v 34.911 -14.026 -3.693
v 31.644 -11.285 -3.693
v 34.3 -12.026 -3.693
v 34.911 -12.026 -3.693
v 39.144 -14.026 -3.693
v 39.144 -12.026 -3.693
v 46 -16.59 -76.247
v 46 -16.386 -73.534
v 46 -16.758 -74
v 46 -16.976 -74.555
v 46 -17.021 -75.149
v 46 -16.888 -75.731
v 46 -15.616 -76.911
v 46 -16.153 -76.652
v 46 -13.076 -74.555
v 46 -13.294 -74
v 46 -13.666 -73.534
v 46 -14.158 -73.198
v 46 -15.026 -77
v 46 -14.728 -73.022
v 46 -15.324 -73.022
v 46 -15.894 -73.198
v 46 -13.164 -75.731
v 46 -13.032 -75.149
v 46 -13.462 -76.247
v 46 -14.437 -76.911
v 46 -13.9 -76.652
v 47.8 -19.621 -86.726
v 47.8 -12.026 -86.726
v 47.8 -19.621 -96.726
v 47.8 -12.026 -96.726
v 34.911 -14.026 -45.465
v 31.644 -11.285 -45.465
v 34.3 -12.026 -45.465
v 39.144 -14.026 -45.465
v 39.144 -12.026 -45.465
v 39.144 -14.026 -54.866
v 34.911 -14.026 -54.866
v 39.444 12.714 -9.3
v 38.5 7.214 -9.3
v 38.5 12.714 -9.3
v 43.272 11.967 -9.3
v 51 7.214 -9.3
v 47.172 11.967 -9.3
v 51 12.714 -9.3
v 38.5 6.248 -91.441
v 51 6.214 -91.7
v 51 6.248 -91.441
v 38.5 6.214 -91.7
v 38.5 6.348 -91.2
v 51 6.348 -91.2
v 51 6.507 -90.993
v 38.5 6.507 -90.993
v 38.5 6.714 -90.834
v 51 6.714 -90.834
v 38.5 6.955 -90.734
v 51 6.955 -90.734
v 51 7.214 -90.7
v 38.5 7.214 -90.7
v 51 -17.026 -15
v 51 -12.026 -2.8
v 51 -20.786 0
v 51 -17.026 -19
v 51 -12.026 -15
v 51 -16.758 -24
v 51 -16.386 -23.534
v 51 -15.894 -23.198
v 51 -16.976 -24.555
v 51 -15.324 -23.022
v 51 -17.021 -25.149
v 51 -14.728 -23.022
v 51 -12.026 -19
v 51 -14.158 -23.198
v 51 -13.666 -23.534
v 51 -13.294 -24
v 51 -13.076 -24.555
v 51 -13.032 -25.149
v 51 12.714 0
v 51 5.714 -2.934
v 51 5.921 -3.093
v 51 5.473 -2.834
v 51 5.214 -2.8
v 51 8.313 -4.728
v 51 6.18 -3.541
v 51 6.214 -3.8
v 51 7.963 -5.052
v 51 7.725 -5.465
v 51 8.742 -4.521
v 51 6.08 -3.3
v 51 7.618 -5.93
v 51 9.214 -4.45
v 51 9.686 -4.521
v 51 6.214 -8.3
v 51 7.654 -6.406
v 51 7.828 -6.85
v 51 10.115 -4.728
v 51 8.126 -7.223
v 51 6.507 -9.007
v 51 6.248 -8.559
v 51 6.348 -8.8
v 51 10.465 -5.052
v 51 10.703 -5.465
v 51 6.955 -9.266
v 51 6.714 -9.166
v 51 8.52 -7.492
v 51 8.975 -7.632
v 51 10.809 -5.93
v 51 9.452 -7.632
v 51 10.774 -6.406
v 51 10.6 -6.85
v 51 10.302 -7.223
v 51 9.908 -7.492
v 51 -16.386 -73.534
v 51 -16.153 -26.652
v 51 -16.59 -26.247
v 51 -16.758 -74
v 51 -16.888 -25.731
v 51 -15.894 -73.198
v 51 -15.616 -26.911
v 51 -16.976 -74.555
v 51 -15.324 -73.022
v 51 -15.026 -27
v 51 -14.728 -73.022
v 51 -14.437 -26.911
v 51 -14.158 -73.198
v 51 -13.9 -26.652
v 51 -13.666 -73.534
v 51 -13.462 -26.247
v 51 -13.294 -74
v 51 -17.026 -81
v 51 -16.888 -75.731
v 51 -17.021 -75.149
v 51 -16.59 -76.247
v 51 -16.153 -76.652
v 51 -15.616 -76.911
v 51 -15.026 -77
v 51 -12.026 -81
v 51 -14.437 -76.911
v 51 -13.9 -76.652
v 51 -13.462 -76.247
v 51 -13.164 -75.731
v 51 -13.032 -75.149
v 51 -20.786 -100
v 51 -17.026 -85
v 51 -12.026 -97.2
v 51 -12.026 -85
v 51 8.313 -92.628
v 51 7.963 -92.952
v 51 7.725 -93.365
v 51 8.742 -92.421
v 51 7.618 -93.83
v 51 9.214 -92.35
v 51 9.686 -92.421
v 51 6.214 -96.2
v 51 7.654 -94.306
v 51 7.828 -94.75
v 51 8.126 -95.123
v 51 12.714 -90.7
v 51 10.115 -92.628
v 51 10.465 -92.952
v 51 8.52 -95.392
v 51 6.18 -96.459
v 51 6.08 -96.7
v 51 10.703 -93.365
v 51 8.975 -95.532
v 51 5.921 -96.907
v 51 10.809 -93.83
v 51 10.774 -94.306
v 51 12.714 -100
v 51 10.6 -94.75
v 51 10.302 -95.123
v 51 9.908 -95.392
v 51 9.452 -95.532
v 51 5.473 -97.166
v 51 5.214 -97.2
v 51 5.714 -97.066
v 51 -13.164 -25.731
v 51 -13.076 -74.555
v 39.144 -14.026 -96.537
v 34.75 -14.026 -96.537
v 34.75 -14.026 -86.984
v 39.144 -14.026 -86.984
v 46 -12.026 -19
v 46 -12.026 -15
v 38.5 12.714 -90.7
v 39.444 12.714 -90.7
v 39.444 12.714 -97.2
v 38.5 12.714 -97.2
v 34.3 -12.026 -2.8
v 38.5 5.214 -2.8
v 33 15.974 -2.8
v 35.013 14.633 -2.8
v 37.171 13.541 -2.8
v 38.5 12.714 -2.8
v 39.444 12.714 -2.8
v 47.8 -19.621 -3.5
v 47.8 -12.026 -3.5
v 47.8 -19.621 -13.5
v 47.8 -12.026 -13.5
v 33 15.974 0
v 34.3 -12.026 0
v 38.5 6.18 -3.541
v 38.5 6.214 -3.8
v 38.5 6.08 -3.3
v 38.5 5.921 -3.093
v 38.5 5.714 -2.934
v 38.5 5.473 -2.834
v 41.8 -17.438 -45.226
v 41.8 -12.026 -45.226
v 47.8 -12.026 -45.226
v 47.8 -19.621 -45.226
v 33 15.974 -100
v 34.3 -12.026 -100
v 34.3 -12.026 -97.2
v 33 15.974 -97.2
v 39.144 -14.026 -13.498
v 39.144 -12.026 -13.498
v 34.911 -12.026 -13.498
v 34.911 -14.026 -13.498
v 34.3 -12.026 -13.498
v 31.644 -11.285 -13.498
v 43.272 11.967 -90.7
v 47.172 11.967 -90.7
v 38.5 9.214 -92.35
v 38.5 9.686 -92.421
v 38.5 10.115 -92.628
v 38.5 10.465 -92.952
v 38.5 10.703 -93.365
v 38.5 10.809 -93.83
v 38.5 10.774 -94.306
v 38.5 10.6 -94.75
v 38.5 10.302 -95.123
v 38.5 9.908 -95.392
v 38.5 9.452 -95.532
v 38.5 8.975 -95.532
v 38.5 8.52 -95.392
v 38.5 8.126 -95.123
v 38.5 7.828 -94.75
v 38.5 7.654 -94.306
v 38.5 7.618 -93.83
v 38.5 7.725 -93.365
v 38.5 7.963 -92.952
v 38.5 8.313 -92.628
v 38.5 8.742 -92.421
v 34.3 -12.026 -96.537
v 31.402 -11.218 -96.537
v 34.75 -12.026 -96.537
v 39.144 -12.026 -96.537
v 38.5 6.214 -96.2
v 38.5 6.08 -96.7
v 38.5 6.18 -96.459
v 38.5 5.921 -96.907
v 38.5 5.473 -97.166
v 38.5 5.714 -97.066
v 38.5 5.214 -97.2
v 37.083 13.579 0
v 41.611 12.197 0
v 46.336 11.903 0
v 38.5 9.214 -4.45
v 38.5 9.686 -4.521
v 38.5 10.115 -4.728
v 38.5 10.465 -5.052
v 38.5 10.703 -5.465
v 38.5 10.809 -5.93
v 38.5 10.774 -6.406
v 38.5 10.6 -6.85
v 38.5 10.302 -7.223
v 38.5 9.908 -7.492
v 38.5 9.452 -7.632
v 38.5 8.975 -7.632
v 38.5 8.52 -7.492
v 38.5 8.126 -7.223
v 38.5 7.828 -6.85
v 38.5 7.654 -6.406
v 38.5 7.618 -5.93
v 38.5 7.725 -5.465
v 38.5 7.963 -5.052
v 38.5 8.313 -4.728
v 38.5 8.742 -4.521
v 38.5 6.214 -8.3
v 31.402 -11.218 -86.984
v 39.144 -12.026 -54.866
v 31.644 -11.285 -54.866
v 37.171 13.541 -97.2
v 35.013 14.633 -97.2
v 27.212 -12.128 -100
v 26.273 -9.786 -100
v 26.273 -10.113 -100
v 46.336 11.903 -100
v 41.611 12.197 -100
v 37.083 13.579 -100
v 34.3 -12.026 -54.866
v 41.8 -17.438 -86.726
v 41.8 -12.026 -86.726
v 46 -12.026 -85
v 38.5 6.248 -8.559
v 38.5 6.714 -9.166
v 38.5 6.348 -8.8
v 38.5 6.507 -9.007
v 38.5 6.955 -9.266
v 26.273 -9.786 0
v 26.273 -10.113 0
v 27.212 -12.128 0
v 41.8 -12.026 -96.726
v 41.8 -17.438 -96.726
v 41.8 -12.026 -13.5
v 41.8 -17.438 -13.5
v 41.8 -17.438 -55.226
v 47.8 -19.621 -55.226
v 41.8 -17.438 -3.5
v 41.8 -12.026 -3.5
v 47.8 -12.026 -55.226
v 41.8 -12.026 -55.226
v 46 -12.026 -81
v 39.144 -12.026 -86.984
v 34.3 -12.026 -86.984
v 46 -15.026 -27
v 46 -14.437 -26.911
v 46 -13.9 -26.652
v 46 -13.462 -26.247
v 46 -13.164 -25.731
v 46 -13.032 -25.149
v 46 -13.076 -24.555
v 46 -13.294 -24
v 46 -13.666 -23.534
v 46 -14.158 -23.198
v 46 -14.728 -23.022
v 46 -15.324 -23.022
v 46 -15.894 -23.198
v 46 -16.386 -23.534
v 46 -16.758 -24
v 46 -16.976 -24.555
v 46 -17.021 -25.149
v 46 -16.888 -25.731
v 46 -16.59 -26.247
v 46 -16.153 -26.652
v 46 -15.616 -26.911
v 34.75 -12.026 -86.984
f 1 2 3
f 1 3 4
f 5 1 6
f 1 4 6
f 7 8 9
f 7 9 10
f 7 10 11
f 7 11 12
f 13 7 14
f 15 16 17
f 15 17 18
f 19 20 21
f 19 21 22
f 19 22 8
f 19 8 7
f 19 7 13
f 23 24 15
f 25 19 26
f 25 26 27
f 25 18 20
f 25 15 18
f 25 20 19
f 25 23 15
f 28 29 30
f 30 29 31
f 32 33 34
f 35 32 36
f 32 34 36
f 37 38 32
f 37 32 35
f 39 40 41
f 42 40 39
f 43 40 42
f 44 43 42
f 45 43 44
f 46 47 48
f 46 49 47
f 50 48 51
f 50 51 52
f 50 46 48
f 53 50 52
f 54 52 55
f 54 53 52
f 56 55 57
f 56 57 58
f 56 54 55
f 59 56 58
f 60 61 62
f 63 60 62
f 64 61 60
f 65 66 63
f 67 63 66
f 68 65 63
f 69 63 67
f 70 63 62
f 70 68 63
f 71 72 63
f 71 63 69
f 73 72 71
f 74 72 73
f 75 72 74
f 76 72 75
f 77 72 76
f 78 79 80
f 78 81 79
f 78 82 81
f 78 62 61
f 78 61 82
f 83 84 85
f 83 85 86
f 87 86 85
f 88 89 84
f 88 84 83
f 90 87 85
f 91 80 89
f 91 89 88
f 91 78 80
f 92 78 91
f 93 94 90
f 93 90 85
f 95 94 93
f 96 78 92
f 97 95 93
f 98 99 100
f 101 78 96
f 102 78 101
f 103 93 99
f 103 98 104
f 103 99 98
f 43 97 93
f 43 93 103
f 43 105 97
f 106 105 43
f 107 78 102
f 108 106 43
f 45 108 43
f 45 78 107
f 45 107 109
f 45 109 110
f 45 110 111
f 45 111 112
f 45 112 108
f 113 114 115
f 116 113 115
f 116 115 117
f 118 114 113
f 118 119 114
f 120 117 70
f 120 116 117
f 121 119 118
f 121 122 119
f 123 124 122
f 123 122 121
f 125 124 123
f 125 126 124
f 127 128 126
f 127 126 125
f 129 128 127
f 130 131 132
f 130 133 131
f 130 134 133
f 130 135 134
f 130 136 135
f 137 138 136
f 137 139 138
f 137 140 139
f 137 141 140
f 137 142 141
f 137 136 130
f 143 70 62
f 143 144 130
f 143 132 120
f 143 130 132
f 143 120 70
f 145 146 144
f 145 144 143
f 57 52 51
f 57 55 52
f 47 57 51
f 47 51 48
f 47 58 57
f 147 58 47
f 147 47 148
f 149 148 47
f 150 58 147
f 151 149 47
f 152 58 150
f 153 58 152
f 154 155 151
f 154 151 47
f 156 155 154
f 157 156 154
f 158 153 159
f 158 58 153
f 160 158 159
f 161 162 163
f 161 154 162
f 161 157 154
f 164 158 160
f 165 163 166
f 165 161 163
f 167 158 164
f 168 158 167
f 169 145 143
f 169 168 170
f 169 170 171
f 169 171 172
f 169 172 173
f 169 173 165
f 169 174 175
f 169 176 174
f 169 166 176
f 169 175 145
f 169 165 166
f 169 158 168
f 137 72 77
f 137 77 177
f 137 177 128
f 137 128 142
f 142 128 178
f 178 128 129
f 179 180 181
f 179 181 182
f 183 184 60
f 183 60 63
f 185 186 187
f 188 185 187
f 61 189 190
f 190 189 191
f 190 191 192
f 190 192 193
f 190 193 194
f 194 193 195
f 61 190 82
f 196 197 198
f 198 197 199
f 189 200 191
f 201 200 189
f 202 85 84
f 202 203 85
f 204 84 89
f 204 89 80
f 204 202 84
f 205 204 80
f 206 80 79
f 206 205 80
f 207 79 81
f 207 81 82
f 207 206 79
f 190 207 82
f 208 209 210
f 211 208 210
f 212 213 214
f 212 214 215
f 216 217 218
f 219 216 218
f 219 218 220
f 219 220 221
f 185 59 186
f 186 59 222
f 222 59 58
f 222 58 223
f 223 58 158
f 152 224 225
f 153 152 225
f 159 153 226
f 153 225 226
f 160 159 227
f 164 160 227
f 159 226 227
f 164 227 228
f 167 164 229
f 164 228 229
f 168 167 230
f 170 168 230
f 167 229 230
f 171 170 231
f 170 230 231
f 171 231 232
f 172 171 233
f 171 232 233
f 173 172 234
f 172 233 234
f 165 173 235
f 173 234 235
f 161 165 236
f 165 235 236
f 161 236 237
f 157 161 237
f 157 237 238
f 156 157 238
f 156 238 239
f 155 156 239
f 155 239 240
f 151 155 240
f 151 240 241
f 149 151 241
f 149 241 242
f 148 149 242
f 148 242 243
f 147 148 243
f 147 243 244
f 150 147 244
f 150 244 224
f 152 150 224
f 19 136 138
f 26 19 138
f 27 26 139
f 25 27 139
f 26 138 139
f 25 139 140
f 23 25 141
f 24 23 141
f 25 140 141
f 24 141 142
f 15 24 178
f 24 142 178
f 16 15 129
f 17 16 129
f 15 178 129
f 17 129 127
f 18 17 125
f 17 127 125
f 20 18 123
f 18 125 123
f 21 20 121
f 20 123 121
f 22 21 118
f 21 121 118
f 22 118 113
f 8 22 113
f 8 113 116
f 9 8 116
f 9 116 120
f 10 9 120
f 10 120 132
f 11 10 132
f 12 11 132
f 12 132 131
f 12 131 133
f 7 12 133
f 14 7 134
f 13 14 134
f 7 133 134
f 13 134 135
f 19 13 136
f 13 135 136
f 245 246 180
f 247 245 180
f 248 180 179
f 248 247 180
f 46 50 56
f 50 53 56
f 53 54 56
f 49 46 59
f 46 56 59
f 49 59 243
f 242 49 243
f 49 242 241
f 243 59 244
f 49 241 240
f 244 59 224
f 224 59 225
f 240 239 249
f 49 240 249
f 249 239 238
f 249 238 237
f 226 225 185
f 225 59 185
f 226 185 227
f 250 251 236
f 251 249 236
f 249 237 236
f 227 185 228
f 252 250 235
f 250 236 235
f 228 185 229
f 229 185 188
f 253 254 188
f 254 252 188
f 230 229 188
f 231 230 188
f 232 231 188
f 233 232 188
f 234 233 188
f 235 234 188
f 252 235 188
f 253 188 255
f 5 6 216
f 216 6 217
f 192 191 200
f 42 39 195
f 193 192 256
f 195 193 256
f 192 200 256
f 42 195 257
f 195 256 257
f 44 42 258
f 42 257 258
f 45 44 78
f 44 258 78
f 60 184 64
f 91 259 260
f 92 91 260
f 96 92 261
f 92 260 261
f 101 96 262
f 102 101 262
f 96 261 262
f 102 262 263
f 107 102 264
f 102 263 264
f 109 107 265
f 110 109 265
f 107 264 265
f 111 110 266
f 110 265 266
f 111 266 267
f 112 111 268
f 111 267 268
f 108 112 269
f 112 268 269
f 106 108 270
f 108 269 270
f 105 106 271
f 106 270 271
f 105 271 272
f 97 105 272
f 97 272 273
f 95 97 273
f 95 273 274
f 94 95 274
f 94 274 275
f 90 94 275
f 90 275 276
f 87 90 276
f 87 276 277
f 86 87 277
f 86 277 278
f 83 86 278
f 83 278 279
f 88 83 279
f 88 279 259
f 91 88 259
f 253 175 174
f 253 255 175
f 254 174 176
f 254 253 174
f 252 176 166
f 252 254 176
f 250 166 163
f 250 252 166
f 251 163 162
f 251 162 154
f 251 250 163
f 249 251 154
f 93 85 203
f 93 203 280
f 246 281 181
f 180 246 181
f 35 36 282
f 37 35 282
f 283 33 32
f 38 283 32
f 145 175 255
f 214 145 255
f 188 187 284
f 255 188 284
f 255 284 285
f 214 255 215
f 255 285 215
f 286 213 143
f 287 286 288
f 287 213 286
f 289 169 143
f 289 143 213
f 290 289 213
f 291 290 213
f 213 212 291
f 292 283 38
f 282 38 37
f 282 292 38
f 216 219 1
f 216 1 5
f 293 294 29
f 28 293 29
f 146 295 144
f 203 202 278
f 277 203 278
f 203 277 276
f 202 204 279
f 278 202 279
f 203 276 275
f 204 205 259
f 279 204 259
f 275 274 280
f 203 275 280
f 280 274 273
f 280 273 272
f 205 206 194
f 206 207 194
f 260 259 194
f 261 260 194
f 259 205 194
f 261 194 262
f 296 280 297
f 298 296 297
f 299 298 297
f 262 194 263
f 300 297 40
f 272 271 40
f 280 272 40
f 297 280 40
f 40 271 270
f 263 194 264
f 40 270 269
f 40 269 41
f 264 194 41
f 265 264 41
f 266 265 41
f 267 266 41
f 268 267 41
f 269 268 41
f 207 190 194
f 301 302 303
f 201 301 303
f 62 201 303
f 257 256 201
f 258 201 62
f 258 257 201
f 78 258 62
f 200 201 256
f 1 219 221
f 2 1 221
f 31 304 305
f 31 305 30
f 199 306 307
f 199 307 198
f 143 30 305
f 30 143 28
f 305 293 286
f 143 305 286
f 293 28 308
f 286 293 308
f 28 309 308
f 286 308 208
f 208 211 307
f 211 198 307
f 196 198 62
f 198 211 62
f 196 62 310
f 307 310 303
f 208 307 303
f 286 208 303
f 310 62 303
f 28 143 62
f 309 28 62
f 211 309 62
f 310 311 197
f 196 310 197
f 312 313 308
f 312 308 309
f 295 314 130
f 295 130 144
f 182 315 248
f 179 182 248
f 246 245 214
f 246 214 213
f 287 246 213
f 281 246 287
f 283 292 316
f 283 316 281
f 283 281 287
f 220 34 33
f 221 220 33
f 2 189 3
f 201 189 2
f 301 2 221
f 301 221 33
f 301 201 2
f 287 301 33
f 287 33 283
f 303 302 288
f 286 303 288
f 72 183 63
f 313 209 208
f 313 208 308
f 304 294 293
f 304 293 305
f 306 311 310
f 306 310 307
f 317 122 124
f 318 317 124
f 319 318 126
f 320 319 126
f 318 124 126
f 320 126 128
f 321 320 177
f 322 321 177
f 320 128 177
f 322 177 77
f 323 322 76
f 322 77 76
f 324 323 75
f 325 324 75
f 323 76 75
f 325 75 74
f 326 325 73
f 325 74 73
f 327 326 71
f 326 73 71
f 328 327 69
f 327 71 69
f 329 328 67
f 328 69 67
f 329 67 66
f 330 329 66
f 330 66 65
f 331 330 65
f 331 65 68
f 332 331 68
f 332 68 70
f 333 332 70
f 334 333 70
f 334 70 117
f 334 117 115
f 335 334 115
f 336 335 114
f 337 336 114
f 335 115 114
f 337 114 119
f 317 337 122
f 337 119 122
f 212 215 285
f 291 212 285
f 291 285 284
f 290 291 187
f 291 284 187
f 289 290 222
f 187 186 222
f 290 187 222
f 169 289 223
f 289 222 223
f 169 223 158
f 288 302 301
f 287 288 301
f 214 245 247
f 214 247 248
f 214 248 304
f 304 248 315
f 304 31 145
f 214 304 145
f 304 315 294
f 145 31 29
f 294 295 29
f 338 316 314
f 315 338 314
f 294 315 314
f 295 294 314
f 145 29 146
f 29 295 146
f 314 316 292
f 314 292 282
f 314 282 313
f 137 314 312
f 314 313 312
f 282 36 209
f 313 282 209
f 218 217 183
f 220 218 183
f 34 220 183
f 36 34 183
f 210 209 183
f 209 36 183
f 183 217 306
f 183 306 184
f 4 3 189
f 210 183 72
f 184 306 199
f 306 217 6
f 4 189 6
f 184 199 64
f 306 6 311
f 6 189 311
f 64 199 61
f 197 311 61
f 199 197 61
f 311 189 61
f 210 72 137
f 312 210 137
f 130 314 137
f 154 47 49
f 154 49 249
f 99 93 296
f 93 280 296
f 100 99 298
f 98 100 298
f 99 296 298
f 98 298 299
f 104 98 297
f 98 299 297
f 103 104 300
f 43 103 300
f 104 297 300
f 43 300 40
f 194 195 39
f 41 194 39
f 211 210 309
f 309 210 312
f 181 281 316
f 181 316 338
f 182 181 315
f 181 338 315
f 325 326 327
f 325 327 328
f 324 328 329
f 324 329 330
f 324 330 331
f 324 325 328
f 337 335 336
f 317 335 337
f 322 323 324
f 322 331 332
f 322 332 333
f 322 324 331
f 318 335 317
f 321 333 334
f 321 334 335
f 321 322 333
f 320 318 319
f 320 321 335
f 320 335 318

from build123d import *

# Parameters (mm, degrees)
RESSALTO_EXTRUS_O1_DEPTH = 100
CORTE_EXTRUS_O1_DEPTH    = 100
ESBO_O4_W                = 6
ESBO_O4_H                = 10
CORTE_EXTRUS_O3_DEPTH    = 100
ESBO_O6_W                = 4.394129168
ESBO_O6_H                = 9.553687289
ESBO_O6_W_2              = 4.232922622
ESBO_O6_H_2              = 9.401185036
ESBO_O6_H_3              = 9.804760869
CORTE_EXTRUS_O4_DEPTH    = 2
CORTE_EXTRUS_O5_DEPTH    = 9.804760869
CORTE_EXTRUS_O6_DEPTH    = 9.401185036
CORTE_EXTRUS_O7_DEPTH    = 9.553687289
RESSALTO_EXTRUS_O2_DEPTH = 2.8
RESSALTO_EXTRUS_O3_DEPTH = 2.8
CHANFRO1_SIZE            = 1
CHANFRO1_SIZE2           = 1.673157185
ESBO_O12_R               = 2
CORTE_EXTRUS_O8_DEPTH    = 5
ESBO_O14_W               = 6.5
ESBO_O14_H               = 6.5
RESSALTO_EXTRUS_O4_DEPTH = 12.5
CORTE_EXTRUS_O9_DEPTH    = 100
ESBO_O17_R               = 1.6
CORTE_EXTRUS_O10_DEPTH   = 100
FILETE1_R                = 1
ESBO_O18_W               = 5
ESBO_O18_H               = 4
CORTE_EXTRUS_O11_DEPTH   = 5
CHANFRO2_SIZE            = 5


with BuildPart() as part:
    # Esboço1 → Ressalto-extrusão1 (new body)
    with BuildSketch(Plane.XY):
        Polygon((51, -6.786066874), (51, -20.786066874), (26.272703225, -11.786066874), (26.272703225, -6.786066874), align=None)
    extrude(amount=-RESSALTO_EXTRUS_O1_DEPTH)

    # Esboço2 → Corte-extrusão1 (cut)
    with BuildSketch(Plane.XY):
        Polygon((34.3, -12.026146103), (26.272703225, -9.786066874), (26.272703225, -6.786066874), (51, -6.786066874), (51, -12.026146103), (49.5, -12.026146103), align=None)
    extrude(amount=-CORTE_EXTRUS_O1_DEPTH, mode=Mode.SUBTRACT)

    # Esboço4 → Corte-extrusão3 (cut)
    with BuildSketch(Plane(origin=(0, -12.026146103, 0), x_dir=(1, 0, 0), z_dir=(0, 1, 0))):
        with Locations((44.8, 91.726127663)):
            Rectangle(ESBO_O4_W, ESBO_O4_H)
        with Locations((44.8, 50.226127663)):
            Rectangle(ESBO_O4_W, ESBO_O4_H)
        with Locations((44.8, 8.5)):
            Rectangle(ESBO_O4_W, ESBO_O4_H)
    extrude(amount=-CORTE_EXTRUS_O3_DEPTH, mode=Mode.SUBTRACT)

    # Esboço6 → Corte-extrusão4 (cut)
    with BuildSketch(Plane(origin=(0, -12.026146103, 0), x_dir=(1, 0, 0), z_dir=(0, 1, 0))):
        with Locations((36.946648007, 91.760642218)):
            Rectangle(ESBO_O6_W, ESBO_O6_H)
        with Locations((37.02725128, 50.165247763)):
            Rectangle(ESBO_O6_W_2, ESBO_O6_H_2)
        with Locations((37.02725128, 8.595463062)):
            Rectangle(ESBO_O6_W_2, ESBO_O6_H_3)
    extrude(amount=-CORTE_EXTRUS_O4_DEPTH, mode=Mode.SUBTRACT)

    # Esboço7 → Corte-extrusão5 (cut)
    with BuildSketch(Plane.XY.offset(-13.497843496)):
        Polygon((34.910789969, -12.026146103), (34.910789969, -14.026146103), (31.643973079, -11.284961255), align=None)
    extrude(amount=CORTE_EXTRUS_O5_DEPTH, mode=Mode.SUBTRACT)

    # Esboço8 → Corte-extrusão6 (cut)
    with BuildSketch(Plane.XY.offset(-54.865840281)):
        Polygon((34.910789969, -14.026146103), (34.910789969, -12.026146103), (31.335529191, -11.026146103), align=None)
    extrude(amount=CORTE_EXTRUS_O6_DEPTH, mode=Mode.SUBTRACT)

    # Esboço9 → Corte-extrusão7 (cut)
    with BuildSketch(Plane.XY.offset(-96.537485862)):
        Polygon((34.749583423, -14.026146103), (34.749583423, -12.026146103), (30.165579372, -10.179709995), align=None)
    extrude(amount=CORTE_EXTRUS_O7_DEPTH, mode=Mode.SUBTRACT)

    # Esboço10 → Ressalto-extrusão2 (add)
    with BuildSketch(Plane.XY):
        Polygon((51, -12.026146103), (51, 9.973853897), (51, 12.713933126), (49.541118417, 12.747281328), (45.801947659, 12.747281328), (33, 15.973853897), (34.3, -12.026146103), align=None)
    extrude(amount=-RESSALTO_EXTRUS_O2_DEPTH)

    # Esboço11 → Ressalto-extrusão3 (add)
    with BuildSketch(Plane(origin=(0, 0, -100), x_dir=(-1, 0, 0), z_dir=(0, 0, -1))):
        Polygon((-34.3, -12.026146103), (-33, 15.973853897), (-45.271603303, 12.747281328), (-49.541118417, 12.747281328), (-51, 12.713933126), (-51, -12.026146103), align=None)
    extrude(amount=-RESSALTO_EXTRUS_O3_DEPTH)

    # Chanfro1
    chanfro1_edges = [part.edges().sort_by_distance(p)[0] for p in [
        (26.272703225, -11.786066874, -50),
    ]]
    chanfro1_side = [part.faces().sort_by_distance(p)[0] for p in [
        (38.152449511, -16.109940913, -49.988164623),
    ]]
    chamfer(chanfro1_edges, length=CHANFRO1_SIZE, length2=CHANFRO1_SIZE2, reference=chanfro1_side[0])

    # Esboço12 → Corte-extrusão8 (cut)
    with BuildSketch(Plane(origin=(51, 0, 0), x_dir=(0, 0, -1), z_dir=(1, 0, 0))):
        with Locations((75, -15.026146103)):
            Circle(ESBO_O12_R)
        with Locations((25, -15.026146103)):
            Circle(ESBO_O12_R)
    extrude(amount=-CORTE_EXTRUS_O8_DEPTH, mode=Mode.SUBTRACT)

    # Esboço14 → Ressalto-extrusão4 (add)
    with BuildSketch(Plane(origin=(51, 0, 0), x_dir=(0, 0, -1), z_dir=(1, 0, 0))):
        with Locations((6.05, 9.463933126)):
            Rectangle(ESBO_O14_W, ESBO_O14_H)
        with Locations((93.95, 9.463933126)):
            Rectangle(ESBO_O14_W, ESBO_O14_H)
    extrude(amount=-RESSALTO_EXTRUS_O4_DEPTH)

    # Esboço15 → Corte-extrusão9 (cut)
    with BuildSketch(Plane.XY):
        with BuildLine():
            ThreePointArc((33, 15.973853897), (41.611155482, 12.19684706), (51, 12.713933126))
            ThreePointArc((51, 12.713933126), (42.289458716, 15.942170666), (33, 15.973853897))
        make_face()
    extrude(amount=-CORTE_EXTRUS_O9_DEPTH, mode=Mode.SUBTRACT)

    # Esboço17 → Corte-extrusão10 (cut)
    with BuildSketch(Plane.ZY.offset(-38.5)):
        with Locations((-6.05, 9.213933126)):
            Circle(ESBO_O17_R)
        with Locations((-93.95, 9.213933126)):
            Circle(ESBO_O17_R)
    extrude(amount=-CORTE_EXTRUS_O10_DEPTH, mode=Mode.SUBTRACT)

    # Filete1
    filete1_edges = [part.edges().sort_by_distance(p)[0] for p in [
        (44.75, 6.213933126, -2.8),
        (44.75, 6.213933126, -9.3),
        (44.75, 6.213933126, -97.2),
        (44.75, 6.213933126, -90.7),
    ]]
    fillet(filete1_edges, radius=FILETE1_R)

    # Esboço18 → Corte-extrusão11 (cut)
    with BuildSketch(Plane(origin=(0, -12.026146103, 0), x_dir=(1, 0, 0), z_dir=(0, 1, 0))):
        with Locations((48.5, 17)):
            Rectangle(ESBO_O18_W, ESBO_O18_H)
        with Locations((48.5, 83)):
            Rectangle(ESBO_O18_W, ESBO_O18_H)
    extrude(amount=-CORTE_EXTRUS_O11_DEPTH, mode=Mode.SUBTRACT)

    # Chanfro2
    chanfro2_edges = [part.edges().sort_by_distance(p)[0] for p in [
        (46, -17.026146103, -83),
        (46, -17.026146103, -17),
    ]]
    chamfer(chanfro2_edges, length=CHANFRO2_SIZE - 0.0001)  # a hair under: the kernel refuses the full size


solid = part.part
